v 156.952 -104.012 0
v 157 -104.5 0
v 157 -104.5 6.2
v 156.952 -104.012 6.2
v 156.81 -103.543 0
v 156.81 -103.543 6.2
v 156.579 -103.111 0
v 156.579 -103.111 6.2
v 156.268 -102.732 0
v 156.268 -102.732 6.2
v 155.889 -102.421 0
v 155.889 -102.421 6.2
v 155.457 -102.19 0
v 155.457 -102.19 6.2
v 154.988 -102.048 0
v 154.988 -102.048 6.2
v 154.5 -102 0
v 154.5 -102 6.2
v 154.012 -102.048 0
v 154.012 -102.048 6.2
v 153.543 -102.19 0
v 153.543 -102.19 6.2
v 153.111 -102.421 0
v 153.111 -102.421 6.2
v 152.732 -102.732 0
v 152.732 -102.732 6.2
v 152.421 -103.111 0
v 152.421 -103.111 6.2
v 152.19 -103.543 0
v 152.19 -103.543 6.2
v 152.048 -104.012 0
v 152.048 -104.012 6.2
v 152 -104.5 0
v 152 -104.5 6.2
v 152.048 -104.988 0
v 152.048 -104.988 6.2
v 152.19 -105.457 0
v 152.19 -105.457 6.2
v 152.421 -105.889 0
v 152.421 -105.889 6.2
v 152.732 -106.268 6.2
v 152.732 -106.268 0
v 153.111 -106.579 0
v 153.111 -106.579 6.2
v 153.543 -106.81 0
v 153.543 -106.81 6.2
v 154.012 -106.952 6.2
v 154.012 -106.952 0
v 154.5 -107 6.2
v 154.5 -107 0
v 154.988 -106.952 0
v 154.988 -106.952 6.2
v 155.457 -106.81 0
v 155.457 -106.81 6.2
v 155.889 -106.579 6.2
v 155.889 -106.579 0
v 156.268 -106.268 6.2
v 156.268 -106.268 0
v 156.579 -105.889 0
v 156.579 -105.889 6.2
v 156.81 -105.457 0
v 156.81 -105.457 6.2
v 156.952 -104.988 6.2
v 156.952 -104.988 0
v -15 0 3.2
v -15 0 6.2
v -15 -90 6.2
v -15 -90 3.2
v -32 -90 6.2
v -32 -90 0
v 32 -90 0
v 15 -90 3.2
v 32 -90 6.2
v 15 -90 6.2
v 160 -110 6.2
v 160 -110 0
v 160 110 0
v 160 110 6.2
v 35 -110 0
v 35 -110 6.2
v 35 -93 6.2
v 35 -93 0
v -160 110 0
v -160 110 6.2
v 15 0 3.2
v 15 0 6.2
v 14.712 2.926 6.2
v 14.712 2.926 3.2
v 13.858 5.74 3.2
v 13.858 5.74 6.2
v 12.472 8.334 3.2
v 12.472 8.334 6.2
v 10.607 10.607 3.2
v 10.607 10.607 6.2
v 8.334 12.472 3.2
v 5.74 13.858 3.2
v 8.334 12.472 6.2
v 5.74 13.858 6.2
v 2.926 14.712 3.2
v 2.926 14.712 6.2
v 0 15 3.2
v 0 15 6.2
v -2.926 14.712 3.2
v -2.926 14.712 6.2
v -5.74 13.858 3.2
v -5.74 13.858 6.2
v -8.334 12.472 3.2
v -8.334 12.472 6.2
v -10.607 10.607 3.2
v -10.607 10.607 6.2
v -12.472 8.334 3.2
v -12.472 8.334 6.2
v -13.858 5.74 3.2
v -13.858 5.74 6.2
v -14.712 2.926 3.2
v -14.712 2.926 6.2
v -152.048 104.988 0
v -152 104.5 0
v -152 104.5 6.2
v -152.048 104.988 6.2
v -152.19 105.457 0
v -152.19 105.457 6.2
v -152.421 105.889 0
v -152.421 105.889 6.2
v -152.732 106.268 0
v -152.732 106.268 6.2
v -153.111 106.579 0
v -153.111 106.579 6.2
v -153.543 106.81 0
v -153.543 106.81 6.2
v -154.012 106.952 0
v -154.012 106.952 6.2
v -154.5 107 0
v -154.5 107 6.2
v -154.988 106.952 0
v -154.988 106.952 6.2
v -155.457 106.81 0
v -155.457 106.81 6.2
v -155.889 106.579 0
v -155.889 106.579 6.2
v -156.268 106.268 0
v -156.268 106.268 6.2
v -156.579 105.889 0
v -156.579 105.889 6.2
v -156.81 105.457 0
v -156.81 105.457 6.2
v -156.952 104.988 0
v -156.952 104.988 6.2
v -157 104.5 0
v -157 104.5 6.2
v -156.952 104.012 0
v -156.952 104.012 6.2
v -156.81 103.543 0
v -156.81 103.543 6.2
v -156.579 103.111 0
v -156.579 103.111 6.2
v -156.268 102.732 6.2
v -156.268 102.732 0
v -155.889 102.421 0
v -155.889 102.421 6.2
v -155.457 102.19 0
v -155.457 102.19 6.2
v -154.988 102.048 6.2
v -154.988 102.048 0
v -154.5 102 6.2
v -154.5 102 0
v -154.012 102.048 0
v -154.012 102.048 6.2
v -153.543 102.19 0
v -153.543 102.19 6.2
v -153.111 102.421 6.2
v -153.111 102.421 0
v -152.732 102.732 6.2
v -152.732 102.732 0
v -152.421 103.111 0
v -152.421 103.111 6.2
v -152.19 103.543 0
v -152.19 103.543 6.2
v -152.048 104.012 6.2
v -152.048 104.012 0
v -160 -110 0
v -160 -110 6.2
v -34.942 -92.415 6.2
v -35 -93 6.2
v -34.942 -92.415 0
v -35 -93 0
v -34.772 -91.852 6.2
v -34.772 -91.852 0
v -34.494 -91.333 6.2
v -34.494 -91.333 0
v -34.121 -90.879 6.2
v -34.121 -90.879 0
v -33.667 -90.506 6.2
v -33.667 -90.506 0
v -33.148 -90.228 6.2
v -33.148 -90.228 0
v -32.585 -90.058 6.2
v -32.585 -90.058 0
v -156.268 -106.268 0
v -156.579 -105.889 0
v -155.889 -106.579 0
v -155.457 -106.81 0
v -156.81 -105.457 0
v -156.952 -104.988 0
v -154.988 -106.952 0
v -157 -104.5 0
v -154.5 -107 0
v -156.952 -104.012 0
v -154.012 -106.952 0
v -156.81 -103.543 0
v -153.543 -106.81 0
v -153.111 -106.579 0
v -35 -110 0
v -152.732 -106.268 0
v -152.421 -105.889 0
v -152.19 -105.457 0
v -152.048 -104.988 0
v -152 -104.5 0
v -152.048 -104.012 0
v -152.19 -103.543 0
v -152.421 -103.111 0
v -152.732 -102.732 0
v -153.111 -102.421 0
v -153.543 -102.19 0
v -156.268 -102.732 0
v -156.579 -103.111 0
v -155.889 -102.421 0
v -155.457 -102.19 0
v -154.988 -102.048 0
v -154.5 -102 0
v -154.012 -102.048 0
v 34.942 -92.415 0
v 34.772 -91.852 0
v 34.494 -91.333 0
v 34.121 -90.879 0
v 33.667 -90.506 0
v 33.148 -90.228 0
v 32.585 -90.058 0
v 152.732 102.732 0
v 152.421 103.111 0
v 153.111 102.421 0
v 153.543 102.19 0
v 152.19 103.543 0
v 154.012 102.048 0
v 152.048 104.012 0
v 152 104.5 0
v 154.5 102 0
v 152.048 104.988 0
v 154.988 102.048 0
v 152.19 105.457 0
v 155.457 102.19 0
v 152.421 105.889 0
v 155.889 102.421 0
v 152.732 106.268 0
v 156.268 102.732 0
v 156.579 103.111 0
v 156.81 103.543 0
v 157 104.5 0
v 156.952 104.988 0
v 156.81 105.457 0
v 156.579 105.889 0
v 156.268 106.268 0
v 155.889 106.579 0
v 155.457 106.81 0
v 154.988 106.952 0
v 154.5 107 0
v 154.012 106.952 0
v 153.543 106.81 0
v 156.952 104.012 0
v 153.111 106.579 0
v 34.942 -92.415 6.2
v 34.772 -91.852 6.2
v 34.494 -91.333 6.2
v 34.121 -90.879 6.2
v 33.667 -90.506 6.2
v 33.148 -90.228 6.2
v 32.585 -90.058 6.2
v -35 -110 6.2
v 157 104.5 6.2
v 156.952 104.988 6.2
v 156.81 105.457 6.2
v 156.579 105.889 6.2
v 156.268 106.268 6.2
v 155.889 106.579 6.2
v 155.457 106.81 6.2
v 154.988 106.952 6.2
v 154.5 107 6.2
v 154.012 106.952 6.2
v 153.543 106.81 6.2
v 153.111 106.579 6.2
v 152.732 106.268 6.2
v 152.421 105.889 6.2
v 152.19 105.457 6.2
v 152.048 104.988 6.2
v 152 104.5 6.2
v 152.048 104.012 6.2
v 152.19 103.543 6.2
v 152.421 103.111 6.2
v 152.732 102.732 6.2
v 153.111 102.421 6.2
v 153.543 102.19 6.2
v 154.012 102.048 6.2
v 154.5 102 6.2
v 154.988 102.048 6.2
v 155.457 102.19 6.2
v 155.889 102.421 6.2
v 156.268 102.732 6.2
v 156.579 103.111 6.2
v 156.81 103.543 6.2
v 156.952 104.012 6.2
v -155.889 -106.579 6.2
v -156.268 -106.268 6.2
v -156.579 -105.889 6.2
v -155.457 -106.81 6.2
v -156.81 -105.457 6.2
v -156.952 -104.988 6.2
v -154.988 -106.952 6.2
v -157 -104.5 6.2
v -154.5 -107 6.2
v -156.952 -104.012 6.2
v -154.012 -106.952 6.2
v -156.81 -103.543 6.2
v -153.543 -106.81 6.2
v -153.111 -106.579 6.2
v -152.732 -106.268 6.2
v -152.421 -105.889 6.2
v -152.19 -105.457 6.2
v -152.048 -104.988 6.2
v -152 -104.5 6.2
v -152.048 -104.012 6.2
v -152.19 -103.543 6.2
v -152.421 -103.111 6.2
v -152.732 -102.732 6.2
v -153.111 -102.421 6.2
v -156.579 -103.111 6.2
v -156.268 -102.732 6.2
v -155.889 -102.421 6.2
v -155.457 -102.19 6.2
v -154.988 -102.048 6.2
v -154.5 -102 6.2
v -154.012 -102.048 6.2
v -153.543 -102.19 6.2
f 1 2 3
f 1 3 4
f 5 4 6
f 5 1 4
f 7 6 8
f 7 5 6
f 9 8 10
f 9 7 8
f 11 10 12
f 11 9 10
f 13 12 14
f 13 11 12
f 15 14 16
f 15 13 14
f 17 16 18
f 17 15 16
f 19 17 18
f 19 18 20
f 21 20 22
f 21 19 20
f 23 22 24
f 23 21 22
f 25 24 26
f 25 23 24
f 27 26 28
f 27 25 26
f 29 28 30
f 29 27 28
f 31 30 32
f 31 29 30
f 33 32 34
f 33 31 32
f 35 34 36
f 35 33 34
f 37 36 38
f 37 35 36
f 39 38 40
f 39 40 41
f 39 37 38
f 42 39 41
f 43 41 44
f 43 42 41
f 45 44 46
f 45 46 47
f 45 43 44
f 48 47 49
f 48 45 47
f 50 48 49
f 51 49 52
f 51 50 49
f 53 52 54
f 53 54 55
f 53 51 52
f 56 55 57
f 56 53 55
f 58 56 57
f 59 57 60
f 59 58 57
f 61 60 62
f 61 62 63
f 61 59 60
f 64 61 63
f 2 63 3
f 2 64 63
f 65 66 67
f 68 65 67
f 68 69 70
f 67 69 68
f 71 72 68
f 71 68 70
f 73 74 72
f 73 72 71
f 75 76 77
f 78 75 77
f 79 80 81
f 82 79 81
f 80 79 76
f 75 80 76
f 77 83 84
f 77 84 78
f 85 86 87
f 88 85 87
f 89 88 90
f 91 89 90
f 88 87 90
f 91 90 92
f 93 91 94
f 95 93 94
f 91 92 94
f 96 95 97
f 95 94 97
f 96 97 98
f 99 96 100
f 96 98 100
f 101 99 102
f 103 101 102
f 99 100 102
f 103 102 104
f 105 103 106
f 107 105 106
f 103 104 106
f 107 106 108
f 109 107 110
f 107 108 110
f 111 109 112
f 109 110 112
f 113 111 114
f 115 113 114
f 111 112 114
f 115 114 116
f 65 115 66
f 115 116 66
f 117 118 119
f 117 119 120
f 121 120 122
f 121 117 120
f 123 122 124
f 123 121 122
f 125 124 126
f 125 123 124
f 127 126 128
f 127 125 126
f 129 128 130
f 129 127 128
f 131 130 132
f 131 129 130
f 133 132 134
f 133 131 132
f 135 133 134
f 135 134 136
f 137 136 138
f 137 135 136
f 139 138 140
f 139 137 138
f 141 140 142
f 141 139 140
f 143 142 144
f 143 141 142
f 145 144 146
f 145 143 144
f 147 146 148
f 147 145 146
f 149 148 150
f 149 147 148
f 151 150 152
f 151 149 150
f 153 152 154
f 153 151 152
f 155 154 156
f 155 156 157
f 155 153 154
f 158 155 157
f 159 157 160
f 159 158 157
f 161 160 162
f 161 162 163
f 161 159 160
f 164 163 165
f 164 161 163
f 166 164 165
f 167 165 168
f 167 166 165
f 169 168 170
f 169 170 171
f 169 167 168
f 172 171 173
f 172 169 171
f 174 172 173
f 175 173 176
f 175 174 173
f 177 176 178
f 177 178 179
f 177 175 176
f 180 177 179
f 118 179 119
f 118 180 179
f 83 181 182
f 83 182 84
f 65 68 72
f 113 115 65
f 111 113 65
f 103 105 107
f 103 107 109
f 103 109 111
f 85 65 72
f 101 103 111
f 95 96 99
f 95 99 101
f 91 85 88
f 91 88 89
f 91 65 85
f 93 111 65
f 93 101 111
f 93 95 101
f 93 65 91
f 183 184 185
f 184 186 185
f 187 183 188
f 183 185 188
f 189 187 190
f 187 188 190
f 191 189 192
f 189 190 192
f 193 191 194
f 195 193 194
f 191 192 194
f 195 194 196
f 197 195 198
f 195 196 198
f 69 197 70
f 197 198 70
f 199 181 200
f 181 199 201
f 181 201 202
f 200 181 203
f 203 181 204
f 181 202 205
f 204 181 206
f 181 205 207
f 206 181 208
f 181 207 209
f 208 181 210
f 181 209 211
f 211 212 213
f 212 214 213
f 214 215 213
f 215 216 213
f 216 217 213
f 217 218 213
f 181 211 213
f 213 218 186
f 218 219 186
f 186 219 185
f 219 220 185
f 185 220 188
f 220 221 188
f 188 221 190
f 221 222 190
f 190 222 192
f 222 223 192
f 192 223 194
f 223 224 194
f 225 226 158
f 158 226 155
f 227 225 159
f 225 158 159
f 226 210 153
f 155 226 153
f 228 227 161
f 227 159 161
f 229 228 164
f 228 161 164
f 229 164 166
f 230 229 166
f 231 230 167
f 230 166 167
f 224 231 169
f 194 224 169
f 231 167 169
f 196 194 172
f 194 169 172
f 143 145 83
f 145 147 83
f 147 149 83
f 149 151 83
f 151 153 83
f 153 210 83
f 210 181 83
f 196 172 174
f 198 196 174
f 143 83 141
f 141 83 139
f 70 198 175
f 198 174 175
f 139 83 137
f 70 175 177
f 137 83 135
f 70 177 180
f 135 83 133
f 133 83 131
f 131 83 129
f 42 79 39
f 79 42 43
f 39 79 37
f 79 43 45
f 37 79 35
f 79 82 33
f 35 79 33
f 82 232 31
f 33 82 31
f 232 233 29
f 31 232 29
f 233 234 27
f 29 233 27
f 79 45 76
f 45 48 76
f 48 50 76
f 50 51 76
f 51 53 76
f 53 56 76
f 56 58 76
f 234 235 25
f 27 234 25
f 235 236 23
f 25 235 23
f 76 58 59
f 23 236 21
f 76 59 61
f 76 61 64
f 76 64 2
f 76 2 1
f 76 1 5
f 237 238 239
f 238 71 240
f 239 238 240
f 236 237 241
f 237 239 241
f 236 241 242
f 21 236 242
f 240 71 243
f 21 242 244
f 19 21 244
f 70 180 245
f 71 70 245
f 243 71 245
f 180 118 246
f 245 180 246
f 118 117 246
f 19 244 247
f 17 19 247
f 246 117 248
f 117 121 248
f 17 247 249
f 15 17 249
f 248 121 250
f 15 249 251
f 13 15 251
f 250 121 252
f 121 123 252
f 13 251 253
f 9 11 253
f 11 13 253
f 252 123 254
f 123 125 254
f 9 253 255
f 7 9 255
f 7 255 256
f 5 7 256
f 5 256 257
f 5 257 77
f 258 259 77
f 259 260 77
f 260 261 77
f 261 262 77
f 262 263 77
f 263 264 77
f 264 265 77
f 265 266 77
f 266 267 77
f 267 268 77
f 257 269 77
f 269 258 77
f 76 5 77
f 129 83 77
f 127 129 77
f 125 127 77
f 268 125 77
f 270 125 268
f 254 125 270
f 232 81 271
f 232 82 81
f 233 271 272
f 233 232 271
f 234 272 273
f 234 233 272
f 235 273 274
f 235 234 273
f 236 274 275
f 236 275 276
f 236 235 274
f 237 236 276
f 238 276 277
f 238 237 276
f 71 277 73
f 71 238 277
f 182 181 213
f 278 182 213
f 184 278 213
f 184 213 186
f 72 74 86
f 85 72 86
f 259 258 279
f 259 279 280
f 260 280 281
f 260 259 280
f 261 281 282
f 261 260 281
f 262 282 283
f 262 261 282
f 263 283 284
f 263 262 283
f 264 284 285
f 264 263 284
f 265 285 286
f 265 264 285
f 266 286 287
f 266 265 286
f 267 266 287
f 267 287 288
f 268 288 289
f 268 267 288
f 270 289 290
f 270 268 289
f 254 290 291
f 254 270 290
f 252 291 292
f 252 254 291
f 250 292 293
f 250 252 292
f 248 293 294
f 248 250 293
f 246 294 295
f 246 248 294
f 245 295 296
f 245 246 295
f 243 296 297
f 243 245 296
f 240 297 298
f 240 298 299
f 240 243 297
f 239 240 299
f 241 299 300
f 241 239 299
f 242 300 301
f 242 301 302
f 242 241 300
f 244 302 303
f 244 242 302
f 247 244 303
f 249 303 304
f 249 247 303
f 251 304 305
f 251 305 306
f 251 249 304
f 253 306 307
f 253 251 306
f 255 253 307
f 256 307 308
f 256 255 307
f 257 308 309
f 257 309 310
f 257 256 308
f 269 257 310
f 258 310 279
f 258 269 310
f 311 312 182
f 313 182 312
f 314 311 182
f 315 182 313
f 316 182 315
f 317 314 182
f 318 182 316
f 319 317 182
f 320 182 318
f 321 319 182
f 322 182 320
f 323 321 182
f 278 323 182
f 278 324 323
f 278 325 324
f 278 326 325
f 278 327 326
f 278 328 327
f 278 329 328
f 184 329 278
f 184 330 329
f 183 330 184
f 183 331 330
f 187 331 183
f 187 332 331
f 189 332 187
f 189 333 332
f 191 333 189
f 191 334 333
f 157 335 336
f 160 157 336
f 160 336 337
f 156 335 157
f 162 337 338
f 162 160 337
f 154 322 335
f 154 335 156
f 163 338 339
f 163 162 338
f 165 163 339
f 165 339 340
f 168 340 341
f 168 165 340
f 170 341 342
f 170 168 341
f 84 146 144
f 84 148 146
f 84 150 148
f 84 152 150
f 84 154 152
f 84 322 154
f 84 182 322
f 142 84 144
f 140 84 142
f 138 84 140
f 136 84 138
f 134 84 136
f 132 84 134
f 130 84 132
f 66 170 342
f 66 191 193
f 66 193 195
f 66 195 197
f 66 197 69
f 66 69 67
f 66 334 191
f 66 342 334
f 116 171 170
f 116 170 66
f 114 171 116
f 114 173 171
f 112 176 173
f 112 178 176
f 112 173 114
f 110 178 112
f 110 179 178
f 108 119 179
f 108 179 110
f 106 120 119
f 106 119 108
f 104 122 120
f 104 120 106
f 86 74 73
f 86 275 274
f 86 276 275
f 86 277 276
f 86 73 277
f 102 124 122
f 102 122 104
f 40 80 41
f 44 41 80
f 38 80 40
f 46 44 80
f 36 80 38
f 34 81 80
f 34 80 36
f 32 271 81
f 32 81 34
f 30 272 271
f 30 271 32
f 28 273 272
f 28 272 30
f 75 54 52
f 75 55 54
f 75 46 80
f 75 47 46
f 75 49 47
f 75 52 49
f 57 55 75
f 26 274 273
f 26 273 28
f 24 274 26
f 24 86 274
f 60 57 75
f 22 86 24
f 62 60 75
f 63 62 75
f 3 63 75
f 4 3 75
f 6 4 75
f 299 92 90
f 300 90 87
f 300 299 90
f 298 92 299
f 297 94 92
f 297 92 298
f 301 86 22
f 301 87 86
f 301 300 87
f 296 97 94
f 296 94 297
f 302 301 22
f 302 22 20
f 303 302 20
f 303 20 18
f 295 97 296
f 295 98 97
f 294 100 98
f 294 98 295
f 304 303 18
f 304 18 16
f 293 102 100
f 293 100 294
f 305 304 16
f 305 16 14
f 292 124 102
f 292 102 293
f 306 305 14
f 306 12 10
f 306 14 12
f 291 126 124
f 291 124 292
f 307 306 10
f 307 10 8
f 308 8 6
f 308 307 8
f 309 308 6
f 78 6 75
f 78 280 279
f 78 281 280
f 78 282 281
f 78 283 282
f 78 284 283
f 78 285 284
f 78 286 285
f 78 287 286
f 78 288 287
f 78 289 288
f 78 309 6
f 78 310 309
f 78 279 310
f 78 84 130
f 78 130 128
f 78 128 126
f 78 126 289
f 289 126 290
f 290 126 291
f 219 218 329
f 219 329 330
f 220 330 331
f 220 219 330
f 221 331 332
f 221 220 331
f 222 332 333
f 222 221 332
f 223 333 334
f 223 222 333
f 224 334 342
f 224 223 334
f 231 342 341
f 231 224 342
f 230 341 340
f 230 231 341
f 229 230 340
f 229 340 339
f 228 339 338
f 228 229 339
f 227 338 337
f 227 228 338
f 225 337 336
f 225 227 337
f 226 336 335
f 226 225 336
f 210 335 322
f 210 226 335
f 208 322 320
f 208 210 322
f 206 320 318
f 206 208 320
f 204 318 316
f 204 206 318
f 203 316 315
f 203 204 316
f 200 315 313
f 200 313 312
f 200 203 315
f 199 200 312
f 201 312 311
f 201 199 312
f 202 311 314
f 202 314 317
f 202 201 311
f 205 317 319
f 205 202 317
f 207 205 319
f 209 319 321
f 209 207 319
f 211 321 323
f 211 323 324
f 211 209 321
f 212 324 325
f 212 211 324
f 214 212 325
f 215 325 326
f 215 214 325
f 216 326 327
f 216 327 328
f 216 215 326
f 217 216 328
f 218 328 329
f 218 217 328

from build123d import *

# Parameters (mm, degrees)
F0_W     = 320
F0_H     = 220
F0_R     = 2.5
F1_DEPTH = 6.2
F3_DEPTH = 3
F4_W     = 70
F4_H     = 20
F5_DEPTH = 25
F6_R     = 3


with BuildPart() as f1:
    # F0 (on Top) → F1 (new body)
    with BuildSketch(Plane.XY):
        Rectangle(F0_W, F0_H)
        with Locations((-154.5, -104.5)):
            Circle(F0_R, mode=Mode.SUBTRACT)
        with Locations((154.5, -104.5)):
            Circle(F0_R, mode=Mode.SUBTRACT)
        with Locations((-154.5, 104.5)):
            Circle(F0_R, mode=Mode.SUBTRACT)
        with Locations((154.5, 104.5)):
            Circle(F0_R, mode=Mode.SUBTRACT)
    extrude(amount=F1_DEPTH)

    # F2 (on face) → F3 (cut)
    with BuildSketch(Plane.XY.offset(6.2)):
        with BuildLine():
            Line((-15, 0), (15, 0))
            ThreePointArc((15, 0), (0, 15), (-15, 0))
        make_face()
        with BuildLine():
            Line((15, -110), (15, 0))
            ThreePointArc((15, 0), (0, -15), (-15, 0))
            Line((-15, 0), (-15, -110))
            Line((-15, -110), (15, -110))
        make_face()
        with BuildLine():
            ThreePointArc((-15, 0), (0, -15), (15, 0))
            Line((15, 0), (-15, 0))
        make_face()
    extrude(amount=-F3_DEPTH, mode=Mode.SUBTRACT)

    # F4 (on face) → F5 (cut)
    with BuildSketch(Plane.XY.offset(6.2)):
        with Locations((0, -100)):
            Rectangle(F4_W, F4_H)
    extrude(amount=-F5_DEPTH, mode=Mode.SUBTRACT)

    # F6
    f6_edges = [f1.edges().sort_by_distance(p)[0] for p in [
        (35, -90, 3.1),
        (-35, -90, 3.1),
    ]]
    fillet(f6_edges, radius=F6_R)


solid = f1.part
